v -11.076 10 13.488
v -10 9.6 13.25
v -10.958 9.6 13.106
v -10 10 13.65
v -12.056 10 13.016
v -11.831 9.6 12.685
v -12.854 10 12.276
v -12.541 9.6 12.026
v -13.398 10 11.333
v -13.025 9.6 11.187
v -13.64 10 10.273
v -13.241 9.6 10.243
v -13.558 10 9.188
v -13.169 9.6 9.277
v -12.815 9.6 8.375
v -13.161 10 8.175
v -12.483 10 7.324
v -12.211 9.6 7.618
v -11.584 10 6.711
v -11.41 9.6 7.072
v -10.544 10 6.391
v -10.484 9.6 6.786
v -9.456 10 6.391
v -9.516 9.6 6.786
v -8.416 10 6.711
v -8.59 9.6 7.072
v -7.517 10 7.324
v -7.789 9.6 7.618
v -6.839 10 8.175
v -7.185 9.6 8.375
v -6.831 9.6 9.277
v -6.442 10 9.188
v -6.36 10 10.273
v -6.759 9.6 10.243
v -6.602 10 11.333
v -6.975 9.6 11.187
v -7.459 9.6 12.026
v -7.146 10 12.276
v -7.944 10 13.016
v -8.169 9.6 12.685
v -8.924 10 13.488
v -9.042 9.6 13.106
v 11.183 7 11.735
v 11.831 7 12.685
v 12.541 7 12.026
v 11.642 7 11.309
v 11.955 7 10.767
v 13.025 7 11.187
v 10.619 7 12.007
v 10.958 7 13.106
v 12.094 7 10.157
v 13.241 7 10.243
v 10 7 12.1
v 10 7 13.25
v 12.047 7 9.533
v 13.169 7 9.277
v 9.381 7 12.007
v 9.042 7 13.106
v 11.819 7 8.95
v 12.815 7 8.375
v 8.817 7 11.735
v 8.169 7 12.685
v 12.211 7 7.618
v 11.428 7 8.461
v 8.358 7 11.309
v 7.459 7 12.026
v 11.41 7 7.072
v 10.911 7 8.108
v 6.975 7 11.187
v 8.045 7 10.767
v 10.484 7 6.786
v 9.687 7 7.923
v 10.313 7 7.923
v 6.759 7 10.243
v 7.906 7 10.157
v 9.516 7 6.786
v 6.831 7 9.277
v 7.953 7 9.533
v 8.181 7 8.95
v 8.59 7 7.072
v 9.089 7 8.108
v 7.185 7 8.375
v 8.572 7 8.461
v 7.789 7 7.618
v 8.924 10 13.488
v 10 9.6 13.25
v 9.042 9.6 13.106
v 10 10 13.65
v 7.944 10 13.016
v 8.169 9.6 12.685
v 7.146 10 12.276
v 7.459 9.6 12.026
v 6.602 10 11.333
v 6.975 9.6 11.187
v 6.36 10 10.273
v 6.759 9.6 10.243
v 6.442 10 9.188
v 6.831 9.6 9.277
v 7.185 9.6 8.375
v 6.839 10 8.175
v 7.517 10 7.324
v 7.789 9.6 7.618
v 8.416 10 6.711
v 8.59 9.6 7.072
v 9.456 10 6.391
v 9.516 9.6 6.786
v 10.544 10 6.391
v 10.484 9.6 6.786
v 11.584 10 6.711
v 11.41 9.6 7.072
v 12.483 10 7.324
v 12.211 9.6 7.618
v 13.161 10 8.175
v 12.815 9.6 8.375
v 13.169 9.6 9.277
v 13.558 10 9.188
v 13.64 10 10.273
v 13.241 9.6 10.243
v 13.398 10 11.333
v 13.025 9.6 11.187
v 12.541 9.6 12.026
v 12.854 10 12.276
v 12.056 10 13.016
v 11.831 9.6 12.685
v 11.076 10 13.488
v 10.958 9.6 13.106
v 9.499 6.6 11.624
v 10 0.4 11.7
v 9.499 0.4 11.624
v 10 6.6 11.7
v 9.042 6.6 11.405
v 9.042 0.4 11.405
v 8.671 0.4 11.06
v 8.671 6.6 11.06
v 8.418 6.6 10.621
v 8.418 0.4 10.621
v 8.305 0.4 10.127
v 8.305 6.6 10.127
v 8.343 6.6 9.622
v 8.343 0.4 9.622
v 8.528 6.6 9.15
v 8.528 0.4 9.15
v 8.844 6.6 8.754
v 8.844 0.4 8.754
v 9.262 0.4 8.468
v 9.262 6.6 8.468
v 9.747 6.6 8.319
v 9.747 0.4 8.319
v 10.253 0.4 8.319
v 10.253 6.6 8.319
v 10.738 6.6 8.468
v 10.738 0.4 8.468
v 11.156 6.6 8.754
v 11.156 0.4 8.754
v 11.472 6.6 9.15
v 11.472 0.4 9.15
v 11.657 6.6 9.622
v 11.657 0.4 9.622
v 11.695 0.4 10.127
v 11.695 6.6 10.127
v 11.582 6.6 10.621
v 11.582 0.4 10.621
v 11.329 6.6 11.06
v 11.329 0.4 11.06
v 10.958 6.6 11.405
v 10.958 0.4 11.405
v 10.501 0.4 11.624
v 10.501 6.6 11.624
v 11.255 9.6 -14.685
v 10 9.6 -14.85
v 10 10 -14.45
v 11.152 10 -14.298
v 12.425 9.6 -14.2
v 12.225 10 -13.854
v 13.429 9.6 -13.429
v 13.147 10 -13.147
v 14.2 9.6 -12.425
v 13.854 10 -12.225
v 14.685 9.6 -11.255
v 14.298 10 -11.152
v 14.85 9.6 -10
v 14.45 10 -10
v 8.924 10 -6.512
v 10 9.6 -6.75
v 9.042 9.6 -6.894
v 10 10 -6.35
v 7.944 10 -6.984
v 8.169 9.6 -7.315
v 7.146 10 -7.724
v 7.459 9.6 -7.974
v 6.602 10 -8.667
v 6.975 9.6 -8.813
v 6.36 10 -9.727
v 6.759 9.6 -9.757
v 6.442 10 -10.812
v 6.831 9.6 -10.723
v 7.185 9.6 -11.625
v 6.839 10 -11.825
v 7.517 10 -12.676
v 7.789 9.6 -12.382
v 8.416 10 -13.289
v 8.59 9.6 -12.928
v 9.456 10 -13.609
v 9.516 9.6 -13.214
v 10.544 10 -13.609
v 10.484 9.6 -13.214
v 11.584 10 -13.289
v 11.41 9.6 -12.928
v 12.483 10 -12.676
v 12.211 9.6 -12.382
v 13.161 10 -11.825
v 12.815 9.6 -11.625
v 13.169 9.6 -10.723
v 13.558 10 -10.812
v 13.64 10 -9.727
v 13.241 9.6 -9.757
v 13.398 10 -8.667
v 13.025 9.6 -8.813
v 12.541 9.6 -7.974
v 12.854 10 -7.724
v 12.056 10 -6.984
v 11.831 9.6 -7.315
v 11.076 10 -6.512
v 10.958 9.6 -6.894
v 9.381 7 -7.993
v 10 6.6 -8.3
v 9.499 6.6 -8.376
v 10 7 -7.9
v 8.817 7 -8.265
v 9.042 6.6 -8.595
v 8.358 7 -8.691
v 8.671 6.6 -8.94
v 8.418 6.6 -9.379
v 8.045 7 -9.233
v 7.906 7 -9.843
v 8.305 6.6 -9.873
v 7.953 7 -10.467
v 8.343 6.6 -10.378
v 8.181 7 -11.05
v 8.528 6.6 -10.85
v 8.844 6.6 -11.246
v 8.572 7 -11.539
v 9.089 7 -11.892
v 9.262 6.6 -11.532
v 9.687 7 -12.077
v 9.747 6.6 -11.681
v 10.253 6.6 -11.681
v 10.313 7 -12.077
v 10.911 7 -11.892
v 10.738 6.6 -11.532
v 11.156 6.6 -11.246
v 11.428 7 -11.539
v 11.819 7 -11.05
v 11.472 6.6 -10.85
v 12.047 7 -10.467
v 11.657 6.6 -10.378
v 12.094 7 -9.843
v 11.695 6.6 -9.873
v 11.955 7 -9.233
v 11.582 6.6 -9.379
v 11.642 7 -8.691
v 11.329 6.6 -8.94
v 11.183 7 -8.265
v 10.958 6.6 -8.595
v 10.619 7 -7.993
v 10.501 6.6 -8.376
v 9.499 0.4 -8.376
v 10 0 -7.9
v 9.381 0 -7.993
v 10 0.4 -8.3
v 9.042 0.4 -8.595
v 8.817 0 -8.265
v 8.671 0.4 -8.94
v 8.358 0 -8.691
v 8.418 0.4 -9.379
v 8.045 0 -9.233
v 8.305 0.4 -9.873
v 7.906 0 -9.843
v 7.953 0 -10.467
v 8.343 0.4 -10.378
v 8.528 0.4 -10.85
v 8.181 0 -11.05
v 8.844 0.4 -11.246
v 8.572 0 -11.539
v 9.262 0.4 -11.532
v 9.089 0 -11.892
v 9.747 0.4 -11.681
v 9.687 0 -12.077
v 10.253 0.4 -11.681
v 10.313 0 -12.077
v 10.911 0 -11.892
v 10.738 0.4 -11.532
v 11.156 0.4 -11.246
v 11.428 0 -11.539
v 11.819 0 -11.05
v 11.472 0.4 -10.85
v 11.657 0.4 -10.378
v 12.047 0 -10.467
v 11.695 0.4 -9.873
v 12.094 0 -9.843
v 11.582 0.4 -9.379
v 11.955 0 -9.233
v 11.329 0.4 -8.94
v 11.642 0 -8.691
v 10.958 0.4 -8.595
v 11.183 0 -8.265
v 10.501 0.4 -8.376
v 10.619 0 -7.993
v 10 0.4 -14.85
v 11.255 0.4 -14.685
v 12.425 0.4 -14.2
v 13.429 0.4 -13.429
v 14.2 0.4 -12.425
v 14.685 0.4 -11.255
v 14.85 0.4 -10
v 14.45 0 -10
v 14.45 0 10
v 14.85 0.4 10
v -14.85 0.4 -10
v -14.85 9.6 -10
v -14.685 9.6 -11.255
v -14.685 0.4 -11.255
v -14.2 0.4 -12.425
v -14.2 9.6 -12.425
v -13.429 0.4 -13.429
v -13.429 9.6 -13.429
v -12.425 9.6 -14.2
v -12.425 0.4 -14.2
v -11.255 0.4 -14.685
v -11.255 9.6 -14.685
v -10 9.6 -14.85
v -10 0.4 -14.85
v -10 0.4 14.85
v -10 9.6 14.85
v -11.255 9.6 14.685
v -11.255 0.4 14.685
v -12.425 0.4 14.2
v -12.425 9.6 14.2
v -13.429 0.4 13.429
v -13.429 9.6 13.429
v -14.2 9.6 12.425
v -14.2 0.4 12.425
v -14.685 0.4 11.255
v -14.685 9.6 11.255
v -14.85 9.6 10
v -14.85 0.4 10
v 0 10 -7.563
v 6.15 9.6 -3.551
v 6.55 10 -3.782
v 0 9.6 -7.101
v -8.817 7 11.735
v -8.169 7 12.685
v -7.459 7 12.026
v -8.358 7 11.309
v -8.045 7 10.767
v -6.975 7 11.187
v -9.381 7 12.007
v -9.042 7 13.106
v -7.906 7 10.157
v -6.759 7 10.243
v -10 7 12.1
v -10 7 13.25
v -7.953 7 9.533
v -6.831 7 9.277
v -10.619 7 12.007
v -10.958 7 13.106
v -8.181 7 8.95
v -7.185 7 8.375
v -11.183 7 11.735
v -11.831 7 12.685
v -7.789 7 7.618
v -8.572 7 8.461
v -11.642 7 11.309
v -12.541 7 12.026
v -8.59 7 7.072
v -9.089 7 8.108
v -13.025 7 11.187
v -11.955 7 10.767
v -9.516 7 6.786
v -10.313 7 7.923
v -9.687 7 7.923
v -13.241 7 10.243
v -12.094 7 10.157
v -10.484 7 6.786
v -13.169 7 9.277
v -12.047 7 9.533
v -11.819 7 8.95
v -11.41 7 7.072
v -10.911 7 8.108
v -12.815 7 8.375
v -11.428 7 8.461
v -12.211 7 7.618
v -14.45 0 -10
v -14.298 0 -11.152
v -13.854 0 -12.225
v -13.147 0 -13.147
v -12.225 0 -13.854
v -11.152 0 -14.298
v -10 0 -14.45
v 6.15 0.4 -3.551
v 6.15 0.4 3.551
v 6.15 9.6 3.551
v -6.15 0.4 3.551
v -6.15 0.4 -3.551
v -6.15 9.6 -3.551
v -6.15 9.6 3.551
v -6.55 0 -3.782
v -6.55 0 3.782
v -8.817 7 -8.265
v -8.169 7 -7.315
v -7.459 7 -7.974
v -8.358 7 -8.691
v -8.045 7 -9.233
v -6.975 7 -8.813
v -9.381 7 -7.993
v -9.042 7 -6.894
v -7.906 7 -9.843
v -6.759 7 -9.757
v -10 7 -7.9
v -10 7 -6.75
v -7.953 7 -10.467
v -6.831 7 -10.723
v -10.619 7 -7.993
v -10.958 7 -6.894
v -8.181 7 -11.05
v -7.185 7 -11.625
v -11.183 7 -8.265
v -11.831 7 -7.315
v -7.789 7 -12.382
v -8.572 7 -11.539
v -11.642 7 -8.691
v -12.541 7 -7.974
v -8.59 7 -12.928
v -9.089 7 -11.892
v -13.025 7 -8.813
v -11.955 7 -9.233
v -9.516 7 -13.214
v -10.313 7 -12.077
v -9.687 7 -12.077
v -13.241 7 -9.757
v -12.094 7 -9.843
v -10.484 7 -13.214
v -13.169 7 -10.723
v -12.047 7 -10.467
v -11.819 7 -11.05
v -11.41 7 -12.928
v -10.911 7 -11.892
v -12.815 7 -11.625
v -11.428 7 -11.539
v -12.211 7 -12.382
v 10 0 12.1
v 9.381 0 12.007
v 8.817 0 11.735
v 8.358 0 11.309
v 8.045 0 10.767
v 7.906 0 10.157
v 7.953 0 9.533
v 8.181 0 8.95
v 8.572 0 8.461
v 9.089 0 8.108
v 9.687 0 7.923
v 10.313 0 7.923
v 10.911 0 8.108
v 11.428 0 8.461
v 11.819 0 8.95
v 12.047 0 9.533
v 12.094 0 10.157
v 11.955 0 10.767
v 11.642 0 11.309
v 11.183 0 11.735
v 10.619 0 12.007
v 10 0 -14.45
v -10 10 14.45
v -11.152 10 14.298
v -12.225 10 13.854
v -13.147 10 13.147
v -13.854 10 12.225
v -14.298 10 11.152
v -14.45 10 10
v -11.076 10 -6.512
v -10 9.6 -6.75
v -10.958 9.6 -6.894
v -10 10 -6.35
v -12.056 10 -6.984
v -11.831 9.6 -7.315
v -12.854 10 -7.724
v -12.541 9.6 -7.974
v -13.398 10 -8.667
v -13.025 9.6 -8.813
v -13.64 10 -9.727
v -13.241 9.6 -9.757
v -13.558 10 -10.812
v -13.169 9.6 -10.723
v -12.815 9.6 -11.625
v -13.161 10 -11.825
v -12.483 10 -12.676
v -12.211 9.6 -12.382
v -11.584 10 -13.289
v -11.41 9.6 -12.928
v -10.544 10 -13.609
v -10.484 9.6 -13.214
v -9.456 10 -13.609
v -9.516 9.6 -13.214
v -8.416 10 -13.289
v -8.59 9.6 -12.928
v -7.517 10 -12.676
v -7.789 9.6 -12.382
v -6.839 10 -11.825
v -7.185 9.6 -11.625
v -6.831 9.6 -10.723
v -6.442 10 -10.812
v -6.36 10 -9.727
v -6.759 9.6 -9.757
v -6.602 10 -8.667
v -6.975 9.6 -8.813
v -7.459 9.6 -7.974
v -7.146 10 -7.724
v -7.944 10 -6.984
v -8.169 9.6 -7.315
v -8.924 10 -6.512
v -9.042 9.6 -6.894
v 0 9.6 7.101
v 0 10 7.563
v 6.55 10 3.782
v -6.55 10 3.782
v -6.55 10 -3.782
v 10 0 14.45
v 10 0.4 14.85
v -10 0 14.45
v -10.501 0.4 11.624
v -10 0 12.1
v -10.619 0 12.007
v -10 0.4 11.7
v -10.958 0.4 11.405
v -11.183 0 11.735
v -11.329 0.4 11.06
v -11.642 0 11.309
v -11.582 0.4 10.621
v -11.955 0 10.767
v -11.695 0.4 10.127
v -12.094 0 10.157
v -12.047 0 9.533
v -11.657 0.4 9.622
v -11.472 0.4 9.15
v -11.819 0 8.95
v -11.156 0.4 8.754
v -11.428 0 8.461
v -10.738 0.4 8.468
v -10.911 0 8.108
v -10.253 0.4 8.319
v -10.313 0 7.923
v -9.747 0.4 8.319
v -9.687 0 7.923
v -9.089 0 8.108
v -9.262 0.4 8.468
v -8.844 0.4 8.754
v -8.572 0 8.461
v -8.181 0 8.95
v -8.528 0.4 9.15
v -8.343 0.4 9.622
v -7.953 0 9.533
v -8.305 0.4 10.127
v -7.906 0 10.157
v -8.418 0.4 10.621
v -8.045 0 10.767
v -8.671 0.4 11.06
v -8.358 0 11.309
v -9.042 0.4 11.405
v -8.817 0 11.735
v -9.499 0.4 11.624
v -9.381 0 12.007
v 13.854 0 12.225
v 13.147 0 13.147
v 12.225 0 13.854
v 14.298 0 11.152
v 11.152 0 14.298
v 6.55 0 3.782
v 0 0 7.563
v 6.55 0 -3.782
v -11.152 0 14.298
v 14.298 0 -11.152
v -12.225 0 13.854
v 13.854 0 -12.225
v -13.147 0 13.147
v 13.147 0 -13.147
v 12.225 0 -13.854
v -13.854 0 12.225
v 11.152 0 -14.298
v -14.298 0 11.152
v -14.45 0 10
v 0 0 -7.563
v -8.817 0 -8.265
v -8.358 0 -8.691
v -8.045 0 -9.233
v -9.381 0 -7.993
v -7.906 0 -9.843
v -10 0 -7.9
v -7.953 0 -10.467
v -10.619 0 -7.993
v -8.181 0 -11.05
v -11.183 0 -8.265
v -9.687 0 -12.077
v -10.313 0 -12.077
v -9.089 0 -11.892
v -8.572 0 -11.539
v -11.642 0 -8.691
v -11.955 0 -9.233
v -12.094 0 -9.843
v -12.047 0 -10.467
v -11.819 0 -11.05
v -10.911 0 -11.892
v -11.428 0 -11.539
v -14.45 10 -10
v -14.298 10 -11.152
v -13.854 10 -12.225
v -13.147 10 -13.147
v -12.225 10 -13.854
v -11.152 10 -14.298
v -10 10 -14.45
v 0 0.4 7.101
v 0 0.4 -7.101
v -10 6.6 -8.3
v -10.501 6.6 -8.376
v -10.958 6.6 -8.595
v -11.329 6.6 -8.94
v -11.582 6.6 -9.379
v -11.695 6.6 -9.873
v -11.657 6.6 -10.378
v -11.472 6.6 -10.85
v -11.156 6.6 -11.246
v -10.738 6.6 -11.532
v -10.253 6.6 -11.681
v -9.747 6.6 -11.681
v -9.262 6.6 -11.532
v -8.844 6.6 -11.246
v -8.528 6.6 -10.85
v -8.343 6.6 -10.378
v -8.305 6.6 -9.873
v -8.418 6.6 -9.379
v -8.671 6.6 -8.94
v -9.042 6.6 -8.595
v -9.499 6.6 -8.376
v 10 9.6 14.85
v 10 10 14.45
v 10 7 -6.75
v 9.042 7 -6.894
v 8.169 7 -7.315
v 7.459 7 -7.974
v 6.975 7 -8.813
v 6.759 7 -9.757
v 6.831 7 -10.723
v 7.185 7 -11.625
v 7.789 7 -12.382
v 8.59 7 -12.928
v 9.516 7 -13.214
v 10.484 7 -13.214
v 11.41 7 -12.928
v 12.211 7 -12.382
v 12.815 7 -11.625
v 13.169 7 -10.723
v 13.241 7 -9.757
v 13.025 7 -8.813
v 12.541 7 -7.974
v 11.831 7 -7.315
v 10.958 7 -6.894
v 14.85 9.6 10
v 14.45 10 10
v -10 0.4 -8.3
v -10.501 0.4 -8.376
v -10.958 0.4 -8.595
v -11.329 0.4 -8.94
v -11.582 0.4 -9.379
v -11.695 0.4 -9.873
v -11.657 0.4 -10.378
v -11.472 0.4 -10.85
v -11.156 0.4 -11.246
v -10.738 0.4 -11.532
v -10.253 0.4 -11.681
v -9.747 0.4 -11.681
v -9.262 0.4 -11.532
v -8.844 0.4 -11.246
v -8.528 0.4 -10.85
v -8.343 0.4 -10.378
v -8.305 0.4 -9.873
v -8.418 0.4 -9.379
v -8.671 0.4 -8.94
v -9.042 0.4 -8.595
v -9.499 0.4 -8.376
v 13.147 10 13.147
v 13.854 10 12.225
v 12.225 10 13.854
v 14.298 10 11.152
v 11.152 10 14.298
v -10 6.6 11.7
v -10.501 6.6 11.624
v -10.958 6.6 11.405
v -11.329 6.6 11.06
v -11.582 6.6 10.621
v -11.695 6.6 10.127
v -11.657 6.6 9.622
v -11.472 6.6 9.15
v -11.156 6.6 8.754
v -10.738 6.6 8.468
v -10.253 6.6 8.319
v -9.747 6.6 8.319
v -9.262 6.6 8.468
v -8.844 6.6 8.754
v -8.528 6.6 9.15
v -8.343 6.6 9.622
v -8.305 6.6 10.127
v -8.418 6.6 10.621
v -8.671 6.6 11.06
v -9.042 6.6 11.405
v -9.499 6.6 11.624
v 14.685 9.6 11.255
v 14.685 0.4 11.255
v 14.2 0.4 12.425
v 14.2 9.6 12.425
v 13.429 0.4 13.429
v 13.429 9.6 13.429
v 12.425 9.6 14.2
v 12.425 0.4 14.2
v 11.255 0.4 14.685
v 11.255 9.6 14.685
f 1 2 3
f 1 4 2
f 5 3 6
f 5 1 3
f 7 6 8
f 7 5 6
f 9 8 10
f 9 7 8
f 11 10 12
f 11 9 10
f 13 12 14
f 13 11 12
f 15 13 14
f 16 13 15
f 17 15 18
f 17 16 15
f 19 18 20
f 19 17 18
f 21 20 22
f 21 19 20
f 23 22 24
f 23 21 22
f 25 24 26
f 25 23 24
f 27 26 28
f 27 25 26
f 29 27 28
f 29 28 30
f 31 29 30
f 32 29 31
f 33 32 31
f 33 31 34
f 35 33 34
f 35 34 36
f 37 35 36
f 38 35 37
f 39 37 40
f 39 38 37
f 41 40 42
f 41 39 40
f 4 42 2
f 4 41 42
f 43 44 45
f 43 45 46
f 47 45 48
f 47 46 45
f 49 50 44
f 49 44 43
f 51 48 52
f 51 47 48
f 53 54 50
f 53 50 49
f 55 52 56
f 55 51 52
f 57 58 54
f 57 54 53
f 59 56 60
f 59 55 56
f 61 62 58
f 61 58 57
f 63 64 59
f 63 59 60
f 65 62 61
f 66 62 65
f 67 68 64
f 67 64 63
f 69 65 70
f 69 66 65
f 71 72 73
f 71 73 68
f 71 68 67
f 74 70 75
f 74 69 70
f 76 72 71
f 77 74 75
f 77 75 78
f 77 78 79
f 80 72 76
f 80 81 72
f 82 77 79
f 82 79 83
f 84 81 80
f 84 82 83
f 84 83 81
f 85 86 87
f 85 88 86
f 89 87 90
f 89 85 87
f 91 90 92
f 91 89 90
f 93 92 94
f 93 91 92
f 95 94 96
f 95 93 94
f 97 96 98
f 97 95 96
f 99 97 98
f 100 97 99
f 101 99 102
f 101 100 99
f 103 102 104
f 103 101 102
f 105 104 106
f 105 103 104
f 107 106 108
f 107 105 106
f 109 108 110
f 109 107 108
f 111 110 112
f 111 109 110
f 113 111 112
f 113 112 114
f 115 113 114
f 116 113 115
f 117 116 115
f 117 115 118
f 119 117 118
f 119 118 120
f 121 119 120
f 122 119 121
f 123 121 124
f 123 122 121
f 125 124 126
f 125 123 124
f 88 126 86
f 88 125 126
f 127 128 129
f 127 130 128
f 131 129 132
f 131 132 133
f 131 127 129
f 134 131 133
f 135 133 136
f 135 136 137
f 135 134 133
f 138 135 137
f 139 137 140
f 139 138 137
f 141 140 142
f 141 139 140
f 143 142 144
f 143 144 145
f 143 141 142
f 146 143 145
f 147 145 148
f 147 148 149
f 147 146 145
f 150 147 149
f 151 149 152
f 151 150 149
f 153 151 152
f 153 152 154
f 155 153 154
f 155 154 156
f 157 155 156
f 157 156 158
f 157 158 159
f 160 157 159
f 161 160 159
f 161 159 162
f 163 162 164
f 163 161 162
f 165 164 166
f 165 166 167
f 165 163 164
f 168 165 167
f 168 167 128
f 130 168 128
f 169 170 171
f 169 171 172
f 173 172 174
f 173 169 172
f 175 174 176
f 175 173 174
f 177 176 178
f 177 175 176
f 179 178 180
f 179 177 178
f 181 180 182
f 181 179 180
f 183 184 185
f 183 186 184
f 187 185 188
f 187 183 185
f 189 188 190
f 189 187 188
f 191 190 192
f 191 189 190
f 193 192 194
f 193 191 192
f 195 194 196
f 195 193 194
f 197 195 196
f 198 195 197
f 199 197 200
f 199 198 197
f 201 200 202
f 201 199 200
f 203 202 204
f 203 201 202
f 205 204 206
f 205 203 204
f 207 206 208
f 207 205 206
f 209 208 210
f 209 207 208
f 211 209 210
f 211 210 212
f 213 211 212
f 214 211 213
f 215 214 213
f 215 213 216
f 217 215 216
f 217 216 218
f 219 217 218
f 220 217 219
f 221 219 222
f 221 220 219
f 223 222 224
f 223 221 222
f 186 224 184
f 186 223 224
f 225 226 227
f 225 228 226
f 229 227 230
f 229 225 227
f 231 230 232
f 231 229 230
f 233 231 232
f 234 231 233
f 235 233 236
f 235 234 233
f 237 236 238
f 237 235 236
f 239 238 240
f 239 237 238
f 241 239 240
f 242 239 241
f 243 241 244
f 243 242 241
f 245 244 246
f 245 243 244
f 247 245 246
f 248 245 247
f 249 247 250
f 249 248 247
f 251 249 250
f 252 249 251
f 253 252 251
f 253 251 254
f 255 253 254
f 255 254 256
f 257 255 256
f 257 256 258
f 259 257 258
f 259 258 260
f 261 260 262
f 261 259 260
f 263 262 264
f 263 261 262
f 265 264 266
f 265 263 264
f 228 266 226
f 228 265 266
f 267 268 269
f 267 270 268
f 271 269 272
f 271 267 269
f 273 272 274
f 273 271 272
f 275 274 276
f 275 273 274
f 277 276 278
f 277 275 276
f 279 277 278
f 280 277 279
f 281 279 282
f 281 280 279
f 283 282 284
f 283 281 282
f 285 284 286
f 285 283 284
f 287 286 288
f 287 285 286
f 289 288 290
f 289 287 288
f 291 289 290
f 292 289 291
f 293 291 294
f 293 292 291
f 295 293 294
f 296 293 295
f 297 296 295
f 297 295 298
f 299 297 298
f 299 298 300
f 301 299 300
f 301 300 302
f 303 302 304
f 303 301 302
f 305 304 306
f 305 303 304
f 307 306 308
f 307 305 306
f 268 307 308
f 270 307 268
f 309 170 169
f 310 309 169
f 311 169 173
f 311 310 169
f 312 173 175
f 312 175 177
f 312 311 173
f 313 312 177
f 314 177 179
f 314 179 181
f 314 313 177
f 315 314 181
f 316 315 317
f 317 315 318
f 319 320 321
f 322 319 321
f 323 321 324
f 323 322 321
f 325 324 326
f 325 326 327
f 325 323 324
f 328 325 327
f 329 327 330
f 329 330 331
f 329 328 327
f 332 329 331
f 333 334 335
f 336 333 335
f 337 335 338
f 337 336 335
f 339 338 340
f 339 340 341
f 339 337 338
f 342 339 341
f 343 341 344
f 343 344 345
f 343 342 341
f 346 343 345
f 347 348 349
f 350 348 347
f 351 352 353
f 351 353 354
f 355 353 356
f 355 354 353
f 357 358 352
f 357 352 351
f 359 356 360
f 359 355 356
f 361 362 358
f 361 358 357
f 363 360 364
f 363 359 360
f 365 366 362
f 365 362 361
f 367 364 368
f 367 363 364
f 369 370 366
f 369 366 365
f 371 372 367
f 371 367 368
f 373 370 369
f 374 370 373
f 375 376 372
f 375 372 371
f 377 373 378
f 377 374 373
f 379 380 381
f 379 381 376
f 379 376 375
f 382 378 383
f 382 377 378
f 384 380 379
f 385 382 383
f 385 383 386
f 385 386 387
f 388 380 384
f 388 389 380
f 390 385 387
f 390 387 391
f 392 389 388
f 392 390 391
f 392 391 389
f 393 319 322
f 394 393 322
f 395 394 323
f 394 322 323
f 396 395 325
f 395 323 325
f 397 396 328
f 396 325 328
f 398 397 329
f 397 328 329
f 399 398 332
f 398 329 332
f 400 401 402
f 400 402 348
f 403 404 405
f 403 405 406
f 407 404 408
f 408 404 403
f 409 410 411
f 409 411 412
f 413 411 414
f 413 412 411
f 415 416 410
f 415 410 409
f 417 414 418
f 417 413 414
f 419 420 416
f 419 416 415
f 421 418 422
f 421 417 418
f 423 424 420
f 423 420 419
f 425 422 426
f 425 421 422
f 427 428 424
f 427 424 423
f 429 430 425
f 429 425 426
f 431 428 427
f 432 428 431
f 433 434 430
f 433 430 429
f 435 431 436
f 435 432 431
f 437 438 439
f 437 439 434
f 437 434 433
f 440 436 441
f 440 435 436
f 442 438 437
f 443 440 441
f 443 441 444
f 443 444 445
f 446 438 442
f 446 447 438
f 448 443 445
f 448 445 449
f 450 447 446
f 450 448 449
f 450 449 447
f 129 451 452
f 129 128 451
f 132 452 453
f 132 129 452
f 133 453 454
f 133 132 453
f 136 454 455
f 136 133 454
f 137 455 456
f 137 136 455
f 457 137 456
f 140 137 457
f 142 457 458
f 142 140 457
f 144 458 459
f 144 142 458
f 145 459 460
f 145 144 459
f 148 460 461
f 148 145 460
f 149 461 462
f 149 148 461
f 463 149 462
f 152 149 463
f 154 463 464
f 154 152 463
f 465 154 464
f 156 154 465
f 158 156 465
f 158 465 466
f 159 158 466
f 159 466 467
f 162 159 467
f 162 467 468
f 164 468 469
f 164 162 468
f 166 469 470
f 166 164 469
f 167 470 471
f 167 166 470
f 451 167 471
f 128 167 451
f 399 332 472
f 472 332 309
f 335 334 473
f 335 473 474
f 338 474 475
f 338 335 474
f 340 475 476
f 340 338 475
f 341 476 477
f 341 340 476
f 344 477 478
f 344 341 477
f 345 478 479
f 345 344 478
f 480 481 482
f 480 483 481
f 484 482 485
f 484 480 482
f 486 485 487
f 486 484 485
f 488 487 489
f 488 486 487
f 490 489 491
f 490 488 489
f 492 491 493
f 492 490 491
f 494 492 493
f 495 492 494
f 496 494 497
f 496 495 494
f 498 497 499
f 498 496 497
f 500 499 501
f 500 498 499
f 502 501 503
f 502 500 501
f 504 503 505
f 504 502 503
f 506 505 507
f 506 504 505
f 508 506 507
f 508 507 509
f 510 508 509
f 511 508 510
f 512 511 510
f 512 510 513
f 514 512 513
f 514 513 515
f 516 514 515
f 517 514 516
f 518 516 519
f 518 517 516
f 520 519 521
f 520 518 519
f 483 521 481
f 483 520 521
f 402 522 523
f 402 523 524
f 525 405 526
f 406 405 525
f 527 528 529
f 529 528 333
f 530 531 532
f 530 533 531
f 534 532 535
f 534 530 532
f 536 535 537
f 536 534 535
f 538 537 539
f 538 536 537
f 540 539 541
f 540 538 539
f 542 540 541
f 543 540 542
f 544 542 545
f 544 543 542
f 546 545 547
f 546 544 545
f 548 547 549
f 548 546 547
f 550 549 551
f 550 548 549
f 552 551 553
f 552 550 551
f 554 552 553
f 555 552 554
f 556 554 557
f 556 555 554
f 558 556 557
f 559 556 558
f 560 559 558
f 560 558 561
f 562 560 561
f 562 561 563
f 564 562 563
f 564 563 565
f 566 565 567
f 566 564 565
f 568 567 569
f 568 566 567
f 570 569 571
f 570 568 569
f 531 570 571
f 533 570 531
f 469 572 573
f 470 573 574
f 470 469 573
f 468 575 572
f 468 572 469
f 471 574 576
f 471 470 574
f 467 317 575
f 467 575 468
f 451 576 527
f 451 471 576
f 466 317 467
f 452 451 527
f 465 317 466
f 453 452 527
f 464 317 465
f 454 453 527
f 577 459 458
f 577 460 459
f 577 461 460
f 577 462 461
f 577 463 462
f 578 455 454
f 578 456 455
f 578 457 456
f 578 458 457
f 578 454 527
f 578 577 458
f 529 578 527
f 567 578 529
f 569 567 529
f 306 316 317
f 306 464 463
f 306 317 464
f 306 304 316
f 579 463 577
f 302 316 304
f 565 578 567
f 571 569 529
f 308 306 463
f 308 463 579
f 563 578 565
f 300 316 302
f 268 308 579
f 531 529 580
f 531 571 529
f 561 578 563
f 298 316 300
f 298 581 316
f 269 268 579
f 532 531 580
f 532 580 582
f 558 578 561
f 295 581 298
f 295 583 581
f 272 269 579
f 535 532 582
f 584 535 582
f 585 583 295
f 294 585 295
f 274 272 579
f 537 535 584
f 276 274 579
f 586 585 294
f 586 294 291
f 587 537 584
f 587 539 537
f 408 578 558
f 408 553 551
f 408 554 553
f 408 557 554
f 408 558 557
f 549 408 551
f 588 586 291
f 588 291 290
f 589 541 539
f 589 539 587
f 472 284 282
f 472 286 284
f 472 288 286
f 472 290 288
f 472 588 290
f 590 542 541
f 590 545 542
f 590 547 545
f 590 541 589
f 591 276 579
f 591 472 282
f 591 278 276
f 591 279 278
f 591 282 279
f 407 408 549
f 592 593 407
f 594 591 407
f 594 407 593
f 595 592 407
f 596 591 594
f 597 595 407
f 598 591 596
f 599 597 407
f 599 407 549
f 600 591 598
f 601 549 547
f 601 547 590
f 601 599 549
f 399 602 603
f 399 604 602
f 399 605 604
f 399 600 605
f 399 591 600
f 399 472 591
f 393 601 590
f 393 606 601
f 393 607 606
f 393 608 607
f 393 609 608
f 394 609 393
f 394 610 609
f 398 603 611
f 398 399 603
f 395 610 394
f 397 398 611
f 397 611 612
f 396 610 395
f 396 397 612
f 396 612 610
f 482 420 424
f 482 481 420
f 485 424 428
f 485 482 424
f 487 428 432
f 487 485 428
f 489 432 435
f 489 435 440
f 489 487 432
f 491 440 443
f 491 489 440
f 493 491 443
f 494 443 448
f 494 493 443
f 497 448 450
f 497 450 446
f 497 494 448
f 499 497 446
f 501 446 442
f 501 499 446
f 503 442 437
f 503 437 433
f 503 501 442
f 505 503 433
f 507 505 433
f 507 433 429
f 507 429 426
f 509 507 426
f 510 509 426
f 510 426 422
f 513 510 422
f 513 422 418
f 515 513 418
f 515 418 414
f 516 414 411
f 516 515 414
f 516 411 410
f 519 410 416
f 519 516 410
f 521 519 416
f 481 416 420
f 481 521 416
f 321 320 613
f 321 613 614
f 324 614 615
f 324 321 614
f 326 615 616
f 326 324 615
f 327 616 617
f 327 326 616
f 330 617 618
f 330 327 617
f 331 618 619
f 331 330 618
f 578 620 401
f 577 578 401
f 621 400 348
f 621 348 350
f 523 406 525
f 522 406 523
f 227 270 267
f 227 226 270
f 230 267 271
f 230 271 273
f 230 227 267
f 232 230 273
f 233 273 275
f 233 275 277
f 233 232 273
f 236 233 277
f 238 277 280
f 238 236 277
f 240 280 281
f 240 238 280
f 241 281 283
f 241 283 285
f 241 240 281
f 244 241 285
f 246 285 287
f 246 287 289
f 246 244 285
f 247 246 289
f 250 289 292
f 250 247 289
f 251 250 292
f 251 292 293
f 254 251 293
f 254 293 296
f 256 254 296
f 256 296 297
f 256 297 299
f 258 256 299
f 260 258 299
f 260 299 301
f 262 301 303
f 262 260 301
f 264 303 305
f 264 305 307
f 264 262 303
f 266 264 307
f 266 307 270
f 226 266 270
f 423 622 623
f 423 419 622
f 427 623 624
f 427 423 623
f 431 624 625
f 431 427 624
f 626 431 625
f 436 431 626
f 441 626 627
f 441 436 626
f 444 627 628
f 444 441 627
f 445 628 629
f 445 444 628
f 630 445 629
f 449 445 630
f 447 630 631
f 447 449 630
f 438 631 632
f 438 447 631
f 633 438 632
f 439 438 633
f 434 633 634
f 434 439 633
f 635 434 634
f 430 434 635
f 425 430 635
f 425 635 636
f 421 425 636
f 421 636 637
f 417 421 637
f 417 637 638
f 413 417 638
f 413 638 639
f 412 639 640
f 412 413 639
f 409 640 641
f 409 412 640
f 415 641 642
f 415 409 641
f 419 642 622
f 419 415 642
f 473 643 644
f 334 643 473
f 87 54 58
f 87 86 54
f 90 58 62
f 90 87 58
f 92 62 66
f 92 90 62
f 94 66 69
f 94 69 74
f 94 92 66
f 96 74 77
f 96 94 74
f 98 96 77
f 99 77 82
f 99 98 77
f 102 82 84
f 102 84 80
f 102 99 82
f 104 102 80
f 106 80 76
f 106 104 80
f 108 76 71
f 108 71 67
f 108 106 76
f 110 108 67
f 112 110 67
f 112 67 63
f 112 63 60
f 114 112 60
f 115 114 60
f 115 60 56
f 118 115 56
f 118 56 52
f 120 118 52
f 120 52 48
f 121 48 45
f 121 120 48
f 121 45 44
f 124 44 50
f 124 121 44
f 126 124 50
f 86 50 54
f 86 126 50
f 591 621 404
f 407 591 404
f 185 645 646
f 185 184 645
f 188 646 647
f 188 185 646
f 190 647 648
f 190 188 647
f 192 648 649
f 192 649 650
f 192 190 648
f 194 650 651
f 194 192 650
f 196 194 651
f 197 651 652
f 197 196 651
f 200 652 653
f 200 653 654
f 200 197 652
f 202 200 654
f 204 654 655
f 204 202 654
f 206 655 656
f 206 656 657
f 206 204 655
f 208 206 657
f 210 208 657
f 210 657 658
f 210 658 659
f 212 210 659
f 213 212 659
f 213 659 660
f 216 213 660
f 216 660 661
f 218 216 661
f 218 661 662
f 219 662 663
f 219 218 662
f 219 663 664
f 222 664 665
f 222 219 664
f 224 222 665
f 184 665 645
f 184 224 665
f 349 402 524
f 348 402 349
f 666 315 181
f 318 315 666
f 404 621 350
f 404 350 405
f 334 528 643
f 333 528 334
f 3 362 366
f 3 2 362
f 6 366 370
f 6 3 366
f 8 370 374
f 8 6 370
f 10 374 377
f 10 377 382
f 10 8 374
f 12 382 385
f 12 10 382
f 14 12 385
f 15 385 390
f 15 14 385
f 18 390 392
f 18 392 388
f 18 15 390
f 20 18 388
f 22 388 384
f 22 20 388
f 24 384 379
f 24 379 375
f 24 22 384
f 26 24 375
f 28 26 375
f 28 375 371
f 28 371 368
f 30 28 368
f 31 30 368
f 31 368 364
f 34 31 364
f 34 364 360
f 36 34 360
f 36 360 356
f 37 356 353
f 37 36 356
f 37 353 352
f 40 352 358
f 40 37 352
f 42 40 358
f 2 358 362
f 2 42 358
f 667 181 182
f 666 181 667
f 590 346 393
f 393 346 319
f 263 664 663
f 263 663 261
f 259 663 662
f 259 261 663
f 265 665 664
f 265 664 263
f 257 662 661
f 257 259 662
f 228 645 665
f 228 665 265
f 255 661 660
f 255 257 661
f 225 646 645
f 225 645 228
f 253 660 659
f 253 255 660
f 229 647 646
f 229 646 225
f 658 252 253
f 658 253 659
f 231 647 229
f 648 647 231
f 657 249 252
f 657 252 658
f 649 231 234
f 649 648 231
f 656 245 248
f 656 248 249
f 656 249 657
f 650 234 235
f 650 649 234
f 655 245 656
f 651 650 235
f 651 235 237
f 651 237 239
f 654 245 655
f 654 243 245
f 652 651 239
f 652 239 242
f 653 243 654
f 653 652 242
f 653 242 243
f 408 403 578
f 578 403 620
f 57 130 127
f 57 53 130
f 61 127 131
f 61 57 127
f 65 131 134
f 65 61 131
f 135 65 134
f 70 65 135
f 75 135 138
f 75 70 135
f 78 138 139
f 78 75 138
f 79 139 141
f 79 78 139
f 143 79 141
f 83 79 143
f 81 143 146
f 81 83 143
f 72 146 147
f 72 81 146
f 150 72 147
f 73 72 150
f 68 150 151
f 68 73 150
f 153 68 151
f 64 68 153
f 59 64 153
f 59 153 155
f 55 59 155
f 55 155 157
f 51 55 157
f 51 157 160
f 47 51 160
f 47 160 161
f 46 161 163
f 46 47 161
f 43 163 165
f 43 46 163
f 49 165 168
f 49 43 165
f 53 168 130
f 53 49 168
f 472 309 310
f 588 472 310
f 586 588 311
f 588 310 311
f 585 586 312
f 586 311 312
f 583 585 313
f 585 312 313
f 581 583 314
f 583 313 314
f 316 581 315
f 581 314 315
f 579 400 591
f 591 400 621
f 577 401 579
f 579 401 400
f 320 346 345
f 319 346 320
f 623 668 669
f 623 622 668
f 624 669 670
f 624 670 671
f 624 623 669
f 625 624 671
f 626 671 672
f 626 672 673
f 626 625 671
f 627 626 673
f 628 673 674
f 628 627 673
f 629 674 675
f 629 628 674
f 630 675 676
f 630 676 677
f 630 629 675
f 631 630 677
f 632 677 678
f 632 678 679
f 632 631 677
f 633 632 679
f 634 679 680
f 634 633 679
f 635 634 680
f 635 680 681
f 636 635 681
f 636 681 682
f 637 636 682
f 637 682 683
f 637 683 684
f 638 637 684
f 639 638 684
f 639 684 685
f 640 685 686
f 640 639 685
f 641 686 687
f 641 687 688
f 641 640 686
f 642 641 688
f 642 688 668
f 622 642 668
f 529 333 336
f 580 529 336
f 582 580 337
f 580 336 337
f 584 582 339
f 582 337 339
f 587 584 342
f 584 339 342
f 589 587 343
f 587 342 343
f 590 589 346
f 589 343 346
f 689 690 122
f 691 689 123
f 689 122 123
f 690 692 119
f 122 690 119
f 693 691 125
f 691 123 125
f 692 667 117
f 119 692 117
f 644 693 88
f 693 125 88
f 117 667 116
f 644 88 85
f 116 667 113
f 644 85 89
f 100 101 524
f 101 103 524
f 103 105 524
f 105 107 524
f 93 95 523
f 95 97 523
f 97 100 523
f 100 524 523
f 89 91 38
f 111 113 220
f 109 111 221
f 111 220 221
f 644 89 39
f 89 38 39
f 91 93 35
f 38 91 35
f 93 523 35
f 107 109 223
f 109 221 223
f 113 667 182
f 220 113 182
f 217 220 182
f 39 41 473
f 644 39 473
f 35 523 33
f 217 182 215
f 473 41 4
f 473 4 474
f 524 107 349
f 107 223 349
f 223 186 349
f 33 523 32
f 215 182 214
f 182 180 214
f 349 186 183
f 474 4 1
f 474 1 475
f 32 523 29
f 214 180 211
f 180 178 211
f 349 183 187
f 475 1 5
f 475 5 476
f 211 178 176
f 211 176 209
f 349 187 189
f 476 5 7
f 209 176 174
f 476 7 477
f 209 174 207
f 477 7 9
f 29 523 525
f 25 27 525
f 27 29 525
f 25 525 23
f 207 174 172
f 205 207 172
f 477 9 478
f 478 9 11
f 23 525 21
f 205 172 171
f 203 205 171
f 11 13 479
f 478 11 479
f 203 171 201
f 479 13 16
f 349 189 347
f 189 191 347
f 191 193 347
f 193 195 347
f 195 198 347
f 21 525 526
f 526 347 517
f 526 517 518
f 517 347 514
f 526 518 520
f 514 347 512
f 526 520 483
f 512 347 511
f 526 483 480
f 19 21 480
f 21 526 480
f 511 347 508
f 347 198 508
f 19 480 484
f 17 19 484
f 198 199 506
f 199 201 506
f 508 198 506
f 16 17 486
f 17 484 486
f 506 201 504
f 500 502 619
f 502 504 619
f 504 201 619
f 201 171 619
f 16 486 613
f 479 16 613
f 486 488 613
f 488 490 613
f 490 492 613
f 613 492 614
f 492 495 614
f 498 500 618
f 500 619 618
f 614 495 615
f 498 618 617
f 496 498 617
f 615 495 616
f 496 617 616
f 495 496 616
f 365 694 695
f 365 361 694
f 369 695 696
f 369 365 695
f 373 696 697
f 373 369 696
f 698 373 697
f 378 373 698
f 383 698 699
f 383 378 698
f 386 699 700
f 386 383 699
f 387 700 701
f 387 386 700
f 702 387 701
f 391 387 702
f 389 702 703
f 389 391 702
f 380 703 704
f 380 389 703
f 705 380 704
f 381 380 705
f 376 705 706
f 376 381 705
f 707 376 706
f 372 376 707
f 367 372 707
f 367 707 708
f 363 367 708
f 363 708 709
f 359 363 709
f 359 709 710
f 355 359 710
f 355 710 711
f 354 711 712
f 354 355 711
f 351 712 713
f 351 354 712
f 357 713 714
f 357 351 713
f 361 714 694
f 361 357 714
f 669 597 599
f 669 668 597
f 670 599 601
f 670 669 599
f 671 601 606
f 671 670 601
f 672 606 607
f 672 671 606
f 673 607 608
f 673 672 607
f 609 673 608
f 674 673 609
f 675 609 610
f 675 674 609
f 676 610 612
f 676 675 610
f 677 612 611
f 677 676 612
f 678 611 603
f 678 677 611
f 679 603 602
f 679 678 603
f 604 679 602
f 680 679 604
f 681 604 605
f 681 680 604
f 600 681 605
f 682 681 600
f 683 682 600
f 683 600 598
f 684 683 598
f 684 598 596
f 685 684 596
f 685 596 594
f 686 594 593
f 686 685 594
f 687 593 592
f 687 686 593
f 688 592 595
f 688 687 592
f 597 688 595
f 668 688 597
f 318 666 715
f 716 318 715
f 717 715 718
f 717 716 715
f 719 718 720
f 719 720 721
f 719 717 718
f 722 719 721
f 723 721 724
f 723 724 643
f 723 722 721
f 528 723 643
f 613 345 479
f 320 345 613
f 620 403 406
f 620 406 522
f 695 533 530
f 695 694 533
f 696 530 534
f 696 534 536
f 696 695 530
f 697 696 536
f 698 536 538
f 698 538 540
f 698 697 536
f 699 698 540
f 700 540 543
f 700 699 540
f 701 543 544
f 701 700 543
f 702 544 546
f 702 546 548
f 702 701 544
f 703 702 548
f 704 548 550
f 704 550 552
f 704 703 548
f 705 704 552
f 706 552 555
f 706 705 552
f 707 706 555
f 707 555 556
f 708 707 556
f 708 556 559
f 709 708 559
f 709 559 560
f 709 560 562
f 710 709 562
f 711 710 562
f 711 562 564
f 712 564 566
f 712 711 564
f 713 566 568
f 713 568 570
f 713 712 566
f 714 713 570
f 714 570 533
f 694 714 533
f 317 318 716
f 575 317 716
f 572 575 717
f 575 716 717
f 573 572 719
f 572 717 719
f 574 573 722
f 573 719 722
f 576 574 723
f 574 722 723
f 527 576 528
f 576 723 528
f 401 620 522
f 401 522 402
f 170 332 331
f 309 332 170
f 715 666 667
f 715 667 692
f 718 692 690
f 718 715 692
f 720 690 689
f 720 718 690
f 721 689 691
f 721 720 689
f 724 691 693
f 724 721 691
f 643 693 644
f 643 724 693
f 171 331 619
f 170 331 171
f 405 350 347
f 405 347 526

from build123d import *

# Parameters (mm, degrees)
BOSS_EXTRUDE1_DEPTH           = 10
CBORE_FOR_M3_SHCS1_AT_2_COUNT = 2
CBORE_FOR_M3_SHCS1_AT_2_PITCH = 20
CBORE_FOR_M3_SHCS1_AT_3_COUNT = 2
CBORE_FOR_M3_SHCS1_AT_3_PITCH = 28.284271247
CBORE_FOR_M3_SHCS1_AT_4_COUNT = 2
CBORE_FOR_M3_SHCS1_AT_4_PITCH = 20
CHAMFER1_SIZE                 = 0.4


with BuildPart() as part:
    # Sketch3 → Boss-Extrude1 (new body)
    with BuildSketch(Plane(origin=(0, 0, 0), x_dir=(1, 0, 0), z_dir=(0, 1, 0))):
        with BuildLine():
            Line((-14.85, -10), (-14.85, 10))
            ThreePointArc((-14.85, 10), (-13.429467889, 13.429467889), (-10, 14.85))
            Line((-10, 14.85), (10, 14.85))
            ThreePointArc((10, 14.85), (13.429467889, 13.429467889), (14.85, 10))
            Line((14.85, 10), (14.85, -10))
            ThreePointArc((14.85, -10), (13.429467889, -13.429467889), (10, -14.85))
            Line((10, -14.85), (-10, -14.85))
            ThreePointArc((-10, -14.85), (-13.429467889, -13.429467889), (-14.85, -10))
        make_face()
        Polygon((-6.15, 3.550704156), (-6.15, -3.550704156), (0, -7.101408311), (6.15, -3.550704156), (6.15, 3.550704156), (0, 7.101408311), align=None, mode=Mode.SUBTRACT)
    extrude(amount=BOSS_EXTRUDE1_DEPTH)

    # Sketch5 → CBORE for M3 SHCS1 (revolve, cut)
    with BuildSketch(Plane(origin=(-10, 10, -10), x_dir=(0, 0, 1), z_dir=(1, 0, 0))):
        Polygon((0, 0), (0, 10), (2.1, 10), (1.7, 9.6), (1.7, 3.4), (2.1, 3), (3.25, 3), (3.25, 0.4), (3.65, 0), align=None)
    cbore_for_m3_shcs1 = revolve(axis=Axis((-10, 16.35, -10), (0, -1, 0)), mode=Mode.SUBTRACT)

    # CBORE for M3 SHCS1 at 2: CBORE for M3 SHCS1 ×2
    with Locations(*[(i * CBORE_FOR_M3_SHCS1_AT_2_PITCH, 0, 0) for i in range(1, CBORE_FOR_M3_SHCS1_AT_2_COUNT)]):
        add(cbore_for_m3_shcs1, mode=Mode.SUBTRACT)

    # CBORE for M3 SHCS1 at 3: CBORE for M3 SHCS1 ×2
    with Locations(*[Vector(0.7071067811865476, 0, 0.7071067811865476) * (i * CBORE_FOR_M3_SHCS1_AT_3_PITCH) for i in range(1, CBORE_FOR_M3_SHCS1_AT_3_COUNT)]):
        add(cbore_for_m3_shcs1, mode=Mode.SUBTRACT)

    # CBORE for M3 SHCS1 at 4: CBORE for M3 SHCS1 ×2
    with Locations(*[(0, 0, i * CBORE_FOR_M3_SHCS1_AT_4_PITCH) for i in range(1, CBORE_FOR_M3_SHCS1_AT_4_COUNT)]):
        add(cbore_for_m3_shcs1, mode=Mode.SUBTRACT)

    # Chamfer1
    chamfer1_edges = [part.edges().sort_by_distance(p)[0] for p in [
        (14.85, 0, 0),
        (13.429467889, 0, 13.429467889),
        (0, 0, 14.85),
        (-13.429467889, 0, 13.429467889),
        (13.429467889, 10, 13.429467889),
        (14.85, 10, 0),
        (13.429467889, 10, -13.429467889),
        (0, 10, -14.85),
        (-3.075, 0, -5.326056233),
        (-6.15, 0, 0),
        (-3.075, 0, 5.326056233),
        (3.075, 0, 5.326056233),
        (6.15, 0, 0),
        (3.075, 0, -5.326056233),
        (-3.075, 10, -5.326056233),
        (-6.15, 10, 0),
        (-13.429467889, 10, -13.429467889),
        (-3.075, 10, 5.326056233),
        (3.075, 10, 5.326056233),
        (6.15, 10, 0),
        (3.075, 10, -5.326056233),
        (-14.85, 10, 0),
        (-13.429467889, 10, 13.429467889),
        (-14.85, 0, 0),
        (0, 10, 14.85),
        (-13.429467889, 0, -13.429467889),
        (0, 0, -14.85),
        (13.429467889, 0, -13.429467889),
    ]]
    chamfer(chamfer1_edges, length=CHAMFER1_SIZE)


solid = part.part
